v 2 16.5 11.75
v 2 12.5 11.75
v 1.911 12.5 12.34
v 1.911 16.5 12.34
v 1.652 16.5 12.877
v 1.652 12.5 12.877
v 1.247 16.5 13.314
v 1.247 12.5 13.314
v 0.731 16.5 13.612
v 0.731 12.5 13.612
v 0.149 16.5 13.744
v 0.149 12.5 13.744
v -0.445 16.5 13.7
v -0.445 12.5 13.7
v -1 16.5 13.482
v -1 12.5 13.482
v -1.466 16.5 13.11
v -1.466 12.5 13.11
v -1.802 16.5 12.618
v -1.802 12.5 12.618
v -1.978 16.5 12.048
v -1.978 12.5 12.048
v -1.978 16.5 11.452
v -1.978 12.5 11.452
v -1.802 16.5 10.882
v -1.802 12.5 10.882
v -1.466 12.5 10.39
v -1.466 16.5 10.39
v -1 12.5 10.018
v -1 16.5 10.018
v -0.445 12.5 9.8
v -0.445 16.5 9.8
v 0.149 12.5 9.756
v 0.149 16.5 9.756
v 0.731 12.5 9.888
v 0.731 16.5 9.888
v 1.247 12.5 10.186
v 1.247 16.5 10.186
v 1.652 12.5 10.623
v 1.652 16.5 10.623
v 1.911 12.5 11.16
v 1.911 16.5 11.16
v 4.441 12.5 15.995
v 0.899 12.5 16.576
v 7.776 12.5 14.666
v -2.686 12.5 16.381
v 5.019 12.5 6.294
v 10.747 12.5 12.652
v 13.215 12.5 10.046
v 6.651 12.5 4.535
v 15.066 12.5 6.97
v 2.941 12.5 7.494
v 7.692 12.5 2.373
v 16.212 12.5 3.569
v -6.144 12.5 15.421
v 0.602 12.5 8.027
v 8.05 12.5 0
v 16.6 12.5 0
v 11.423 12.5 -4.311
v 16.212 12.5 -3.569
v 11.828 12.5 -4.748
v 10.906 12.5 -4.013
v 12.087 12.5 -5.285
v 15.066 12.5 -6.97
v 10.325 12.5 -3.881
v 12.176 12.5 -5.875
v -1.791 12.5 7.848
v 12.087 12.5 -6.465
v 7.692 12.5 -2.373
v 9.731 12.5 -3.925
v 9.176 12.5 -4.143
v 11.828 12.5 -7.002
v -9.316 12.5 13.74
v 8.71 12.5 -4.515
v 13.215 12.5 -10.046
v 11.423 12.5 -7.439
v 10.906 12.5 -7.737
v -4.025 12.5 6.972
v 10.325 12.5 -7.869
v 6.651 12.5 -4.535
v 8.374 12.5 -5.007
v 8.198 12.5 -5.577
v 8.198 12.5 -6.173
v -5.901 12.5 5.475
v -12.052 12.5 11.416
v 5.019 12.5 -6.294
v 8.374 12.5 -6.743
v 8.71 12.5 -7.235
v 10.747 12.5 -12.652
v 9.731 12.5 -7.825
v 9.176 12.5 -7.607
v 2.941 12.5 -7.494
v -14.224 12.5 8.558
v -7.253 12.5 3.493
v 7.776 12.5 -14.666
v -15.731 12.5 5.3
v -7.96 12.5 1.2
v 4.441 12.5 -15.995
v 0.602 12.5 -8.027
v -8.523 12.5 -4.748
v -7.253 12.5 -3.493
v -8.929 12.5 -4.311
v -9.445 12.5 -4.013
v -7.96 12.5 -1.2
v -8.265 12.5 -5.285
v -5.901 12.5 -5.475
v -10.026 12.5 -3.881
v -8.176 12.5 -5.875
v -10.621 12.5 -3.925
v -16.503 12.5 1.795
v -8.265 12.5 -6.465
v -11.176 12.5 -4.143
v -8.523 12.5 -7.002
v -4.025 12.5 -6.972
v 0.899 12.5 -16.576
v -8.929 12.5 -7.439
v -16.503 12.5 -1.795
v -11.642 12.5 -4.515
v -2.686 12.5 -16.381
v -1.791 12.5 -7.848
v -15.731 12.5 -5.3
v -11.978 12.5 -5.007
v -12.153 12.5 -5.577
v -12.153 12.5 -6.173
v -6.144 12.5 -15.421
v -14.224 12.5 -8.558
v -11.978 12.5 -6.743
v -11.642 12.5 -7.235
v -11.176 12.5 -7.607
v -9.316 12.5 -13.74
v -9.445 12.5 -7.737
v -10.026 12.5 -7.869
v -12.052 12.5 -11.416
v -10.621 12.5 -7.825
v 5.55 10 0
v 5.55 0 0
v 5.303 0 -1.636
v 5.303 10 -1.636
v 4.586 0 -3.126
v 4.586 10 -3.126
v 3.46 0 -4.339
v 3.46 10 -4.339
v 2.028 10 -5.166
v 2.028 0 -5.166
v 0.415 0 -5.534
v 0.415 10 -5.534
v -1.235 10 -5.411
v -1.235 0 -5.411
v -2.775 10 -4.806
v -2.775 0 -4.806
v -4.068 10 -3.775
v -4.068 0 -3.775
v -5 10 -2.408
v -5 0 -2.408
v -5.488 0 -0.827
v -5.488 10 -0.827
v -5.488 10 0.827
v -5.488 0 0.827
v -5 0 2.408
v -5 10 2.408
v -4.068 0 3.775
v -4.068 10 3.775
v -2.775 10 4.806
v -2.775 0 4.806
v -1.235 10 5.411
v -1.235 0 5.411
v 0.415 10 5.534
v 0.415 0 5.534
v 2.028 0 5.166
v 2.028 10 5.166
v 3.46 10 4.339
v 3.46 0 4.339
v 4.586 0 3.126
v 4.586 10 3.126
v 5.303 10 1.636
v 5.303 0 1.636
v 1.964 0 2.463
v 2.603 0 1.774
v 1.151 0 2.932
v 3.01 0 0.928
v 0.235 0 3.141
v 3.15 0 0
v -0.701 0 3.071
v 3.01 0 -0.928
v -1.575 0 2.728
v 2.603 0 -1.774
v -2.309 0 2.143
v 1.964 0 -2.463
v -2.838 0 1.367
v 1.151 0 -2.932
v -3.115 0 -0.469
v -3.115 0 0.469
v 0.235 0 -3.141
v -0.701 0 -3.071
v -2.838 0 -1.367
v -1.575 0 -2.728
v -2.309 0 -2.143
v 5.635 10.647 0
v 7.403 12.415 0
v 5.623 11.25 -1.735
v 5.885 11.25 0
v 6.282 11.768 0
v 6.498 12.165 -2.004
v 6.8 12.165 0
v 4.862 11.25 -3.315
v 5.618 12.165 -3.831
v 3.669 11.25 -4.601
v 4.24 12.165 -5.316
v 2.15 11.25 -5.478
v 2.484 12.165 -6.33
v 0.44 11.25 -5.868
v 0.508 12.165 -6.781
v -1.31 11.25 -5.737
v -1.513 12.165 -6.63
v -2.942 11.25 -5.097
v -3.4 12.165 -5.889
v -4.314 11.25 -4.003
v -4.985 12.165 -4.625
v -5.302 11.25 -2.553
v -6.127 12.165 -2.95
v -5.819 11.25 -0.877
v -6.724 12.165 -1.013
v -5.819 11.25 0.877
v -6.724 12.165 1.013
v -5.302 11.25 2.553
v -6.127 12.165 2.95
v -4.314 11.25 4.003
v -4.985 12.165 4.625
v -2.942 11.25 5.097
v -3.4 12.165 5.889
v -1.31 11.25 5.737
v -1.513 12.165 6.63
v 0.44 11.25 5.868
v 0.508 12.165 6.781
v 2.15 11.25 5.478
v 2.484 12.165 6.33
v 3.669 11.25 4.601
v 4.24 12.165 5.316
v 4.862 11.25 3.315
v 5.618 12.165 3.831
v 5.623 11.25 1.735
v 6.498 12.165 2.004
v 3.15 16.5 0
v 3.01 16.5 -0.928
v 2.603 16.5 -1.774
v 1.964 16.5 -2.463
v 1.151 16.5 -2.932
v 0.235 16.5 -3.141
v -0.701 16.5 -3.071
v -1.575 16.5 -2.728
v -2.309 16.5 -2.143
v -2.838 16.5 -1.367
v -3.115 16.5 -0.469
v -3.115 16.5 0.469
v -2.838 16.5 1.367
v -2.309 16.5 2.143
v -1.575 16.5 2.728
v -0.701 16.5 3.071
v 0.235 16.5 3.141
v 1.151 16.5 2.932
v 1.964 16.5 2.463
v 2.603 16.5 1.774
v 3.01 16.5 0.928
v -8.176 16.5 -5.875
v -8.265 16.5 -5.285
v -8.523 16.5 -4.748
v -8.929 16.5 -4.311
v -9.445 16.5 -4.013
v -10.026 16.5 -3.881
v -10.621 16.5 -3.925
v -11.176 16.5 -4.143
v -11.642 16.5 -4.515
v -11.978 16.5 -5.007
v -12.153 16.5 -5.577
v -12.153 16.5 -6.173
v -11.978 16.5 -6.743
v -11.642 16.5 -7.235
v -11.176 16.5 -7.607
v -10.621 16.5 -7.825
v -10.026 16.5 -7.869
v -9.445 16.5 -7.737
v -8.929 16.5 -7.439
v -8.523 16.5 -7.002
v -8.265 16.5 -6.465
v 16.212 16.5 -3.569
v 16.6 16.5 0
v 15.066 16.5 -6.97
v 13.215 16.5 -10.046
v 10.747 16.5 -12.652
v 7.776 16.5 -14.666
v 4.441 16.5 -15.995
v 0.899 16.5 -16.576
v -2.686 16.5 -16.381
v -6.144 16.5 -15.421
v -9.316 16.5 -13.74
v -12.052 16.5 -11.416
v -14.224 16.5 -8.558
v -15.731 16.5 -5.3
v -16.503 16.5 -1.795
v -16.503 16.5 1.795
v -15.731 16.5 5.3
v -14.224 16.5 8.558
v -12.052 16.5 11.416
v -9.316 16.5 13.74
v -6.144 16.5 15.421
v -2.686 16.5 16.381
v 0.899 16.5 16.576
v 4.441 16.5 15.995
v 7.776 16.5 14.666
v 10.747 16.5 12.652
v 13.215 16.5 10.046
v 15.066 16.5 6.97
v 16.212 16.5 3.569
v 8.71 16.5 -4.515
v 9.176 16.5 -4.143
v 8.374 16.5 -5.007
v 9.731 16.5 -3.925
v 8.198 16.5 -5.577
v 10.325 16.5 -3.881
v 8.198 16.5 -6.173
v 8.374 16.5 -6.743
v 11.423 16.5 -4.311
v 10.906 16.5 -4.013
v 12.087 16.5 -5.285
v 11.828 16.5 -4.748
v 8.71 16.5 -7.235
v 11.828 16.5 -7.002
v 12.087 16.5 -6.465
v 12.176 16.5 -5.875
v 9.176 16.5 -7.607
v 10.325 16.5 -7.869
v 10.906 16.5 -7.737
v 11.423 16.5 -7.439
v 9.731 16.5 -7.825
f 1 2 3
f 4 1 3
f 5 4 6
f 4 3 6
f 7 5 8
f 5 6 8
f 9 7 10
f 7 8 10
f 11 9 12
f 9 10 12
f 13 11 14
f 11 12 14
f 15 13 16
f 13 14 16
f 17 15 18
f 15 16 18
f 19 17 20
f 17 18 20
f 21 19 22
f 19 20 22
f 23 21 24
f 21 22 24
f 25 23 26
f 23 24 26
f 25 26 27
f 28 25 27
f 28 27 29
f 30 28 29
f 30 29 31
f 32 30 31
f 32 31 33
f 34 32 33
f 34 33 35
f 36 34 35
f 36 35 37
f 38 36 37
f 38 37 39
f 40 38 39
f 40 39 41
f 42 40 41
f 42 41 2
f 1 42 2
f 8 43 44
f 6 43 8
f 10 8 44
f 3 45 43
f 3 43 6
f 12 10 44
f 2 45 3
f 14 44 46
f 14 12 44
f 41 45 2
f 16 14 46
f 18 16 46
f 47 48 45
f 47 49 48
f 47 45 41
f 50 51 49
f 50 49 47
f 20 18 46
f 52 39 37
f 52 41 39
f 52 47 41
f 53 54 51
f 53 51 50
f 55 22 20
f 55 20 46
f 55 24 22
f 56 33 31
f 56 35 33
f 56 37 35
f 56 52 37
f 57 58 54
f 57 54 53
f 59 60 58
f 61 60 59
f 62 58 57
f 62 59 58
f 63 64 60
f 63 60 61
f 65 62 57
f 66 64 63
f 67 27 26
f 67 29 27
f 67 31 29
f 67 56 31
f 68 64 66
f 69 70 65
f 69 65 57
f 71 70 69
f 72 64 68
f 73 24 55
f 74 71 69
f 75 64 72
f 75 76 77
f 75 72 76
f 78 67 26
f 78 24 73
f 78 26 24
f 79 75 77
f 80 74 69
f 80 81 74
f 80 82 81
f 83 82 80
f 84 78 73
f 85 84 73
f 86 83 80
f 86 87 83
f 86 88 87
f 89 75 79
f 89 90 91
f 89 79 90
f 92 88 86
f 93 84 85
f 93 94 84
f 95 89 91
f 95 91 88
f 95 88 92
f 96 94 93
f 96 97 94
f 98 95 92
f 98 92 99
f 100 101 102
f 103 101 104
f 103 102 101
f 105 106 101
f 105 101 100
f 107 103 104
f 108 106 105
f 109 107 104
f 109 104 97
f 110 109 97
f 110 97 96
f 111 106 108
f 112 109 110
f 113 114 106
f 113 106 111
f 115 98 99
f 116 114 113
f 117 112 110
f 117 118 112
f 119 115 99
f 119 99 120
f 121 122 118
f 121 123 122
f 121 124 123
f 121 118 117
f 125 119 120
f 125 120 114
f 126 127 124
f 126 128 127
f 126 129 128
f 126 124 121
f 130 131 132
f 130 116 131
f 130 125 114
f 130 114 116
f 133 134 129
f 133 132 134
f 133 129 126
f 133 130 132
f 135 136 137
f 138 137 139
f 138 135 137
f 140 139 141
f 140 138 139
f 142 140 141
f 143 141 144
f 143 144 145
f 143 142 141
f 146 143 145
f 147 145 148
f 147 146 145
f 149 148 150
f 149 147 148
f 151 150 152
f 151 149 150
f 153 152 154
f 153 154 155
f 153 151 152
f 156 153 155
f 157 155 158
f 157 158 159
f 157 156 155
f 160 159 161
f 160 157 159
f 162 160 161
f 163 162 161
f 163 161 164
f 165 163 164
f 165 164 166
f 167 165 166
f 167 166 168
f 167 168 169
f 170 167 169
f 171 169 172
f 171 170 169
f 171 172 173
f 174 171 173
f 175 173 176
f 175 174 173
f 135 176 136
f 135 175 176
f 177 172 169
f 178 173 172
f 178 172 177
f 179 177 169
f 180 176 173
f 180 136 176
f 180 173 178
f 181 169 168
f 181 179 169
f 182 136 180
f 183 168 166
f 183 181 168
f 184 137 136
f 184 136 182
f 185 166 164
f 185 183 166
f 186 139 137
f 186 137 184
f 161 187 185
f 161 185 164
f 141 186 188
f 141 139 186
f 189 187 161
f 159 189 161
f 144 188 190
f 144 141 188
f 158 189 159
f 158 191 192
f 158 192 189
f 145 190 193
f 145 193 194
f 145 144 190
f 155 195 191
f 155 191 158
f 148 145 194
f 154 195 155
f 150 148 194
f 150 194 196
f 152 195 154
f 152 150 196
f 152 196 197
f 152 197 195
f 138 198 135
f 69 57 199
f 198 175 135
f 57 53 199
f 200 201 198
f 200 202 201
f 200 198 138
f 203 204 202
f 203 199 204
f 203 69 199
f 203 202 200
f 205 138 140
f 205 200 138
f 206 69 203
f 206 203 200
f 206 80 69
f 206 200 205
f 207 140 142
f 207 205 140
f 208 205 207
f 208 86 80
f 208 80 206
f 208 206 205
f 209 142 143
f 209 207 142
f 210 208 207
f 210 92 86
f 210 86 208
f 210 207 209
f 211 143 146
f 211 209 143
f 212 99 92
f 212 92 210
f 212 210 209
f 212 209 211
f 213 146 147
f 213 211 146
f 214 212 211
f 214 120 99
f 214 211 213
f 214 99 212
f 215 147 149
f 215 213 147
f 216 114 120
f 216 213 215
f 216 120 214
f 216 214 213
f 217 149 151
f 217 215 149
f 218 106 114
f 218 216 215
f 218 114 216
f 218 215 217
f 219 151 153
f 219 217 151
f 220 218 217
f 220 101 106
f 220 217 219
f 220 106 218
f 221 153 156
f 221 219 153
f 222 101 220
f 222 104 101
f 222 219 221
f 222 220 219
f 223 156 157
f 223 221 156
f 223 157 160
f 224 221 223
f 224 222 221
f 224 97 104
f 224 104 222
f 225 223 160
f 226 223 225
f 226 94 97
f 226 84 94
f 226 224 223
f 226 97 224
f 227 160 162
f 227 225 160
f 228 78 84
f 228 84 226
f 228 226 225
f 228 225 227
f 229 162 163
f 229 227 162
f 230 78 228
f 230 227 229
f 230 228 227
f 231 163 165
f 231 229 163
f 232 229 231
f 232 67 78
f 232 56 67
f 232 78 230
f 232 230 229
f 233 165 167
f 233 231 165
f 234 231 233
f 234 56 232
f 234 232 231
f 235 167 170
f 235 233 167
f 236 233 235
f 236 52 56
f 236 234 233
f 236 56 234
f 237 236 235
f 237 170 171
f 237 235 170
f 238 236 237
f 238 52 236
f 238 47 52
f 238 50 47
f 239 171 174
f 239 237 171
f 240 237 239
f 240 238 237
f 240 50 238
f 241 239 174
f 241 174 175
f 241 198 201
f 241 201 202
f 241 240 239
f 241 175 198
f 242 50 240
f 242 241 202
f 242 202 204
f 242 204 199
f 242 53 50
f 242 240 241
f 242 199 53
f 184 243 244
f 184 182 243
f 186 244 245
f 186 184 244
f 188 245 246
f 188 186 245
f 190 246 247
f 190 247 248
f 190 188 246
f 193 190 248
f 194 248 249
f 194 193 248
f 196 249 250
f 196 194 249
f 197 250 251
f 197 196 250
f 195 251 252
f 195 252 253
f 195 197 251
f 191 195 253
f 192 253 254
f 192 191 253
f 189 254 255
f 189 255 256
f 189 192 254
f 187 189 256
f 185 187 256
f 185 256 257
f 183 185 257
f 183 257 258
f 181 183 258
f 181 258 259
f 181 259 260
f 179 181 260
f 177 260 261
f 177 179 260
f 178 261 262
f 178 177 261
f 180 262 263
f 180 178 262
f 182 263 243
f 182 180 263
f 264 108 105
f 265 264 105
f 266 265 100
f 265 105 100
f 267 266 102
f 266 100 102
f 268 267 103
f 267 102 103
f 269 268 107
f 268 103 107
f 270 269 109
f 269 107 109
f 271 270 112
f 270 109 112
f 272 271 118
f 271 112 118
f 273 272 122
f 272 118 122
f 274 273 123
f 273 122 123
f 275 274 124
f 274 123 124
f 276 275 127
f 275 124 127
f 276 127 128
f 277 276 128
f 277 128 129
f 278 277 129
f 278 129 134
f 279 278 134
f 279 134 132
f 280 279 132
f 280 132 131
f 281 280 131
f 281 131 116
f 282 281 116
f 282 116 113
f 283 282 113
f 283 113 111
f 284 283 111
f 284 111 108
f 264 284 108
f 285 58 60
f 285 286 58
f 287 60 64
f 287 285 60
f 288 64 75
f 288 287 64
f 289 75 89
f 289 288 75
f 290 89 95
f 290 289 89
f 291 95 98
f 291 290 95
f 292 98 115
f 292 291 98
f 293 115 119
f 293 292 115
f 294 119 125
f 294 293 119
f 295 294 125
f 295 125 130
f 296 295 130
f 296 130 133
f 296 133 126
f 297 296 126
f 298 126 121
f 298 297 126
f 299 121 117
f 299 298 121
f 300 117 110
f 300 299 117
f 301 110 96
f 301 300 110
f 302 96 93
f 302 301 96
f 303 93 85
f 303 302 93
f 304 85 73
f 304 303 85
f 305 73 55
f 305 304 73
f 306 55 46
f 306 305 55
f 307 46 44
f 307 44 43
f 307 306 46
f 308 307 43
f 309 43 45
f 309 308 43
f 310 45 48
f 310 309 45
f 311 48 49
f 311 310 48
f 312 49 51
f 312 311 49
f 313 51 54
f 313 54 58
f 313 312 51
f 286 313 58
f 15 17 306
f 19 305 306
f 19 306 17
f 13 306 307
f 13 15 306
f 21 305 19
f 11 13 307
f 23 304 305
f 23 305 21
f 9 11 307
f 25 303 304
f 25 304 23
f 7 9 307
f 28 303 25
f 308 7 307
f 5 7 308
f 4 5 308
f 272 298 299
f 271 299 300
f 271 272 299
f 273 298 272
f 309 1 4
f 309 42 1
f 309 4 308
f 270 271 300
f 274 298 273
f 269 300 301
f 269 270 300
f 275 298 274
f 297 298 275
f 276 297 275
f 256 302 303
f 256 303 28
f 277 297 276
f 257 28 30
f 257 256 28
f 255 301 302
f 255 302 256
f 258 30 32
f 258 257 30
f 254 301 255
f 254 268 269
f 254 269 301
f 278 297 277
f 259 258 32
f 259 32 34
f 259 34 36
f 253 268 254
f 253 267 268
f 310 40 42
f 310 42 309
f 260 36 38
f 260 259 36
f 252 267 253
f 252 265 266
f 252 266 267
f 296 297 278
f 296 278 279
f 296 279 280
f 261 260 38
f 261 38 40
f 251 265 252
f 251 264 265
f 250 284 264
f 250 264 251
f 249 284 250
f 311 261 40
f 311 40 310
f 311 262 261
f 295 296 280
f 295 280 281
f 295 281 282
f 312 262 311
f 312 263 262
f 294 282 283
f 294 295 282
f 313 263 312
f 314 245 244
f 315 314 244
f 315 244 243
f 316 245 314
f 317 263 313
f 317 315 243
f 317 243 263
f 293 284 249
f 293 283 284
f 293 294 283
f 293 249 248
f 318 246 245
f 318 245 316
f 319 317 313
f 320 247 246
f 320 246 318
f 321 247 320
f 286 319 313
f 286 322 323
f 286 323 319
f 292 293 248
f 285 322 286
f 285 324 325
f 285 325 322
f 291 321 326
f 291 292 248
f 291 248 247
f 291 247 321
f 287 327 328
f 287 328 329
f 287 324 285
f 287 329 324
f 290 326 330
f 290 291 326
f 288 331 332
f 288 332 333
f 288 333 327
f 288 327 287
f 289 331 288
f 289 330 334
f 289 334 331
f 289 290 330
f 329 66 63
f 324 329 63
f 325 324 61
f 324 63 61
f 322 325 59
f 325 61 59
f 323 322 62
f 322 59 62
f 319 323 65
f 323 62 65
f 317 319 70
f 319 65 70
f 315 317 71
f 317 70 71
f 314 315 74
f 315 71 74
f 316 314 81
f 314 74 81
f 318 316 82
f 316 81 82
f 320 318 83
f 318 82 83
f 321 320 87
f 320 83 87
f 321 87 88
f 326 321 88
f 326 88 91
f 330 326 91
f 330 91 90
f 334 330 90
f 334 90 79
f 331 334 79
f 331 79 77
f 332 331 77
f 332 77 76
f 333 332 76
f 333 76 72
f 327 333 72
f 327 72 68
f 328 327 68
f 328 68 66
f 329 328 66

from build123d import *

# Parameters (mm, degrees)
ESQUISSE2_R             = 2
ENL_V_MAT_EXTRU_1_DEPTH = 5


with BuildPart() as part:
    # Esquisse1 → Révolution1 (revolve)
    with BuildSketch(Plane.XY):
        with BuildLine():
            Line((16.6, 16.5), (3.15, 16.5))
            Line((3.15, 16.5), (3.15, 0))
            Line((3.15, 0), (5.55, 0))
            Line((5.55, 0), (5.55, 10))
            ThreePointArc((5.55, 10), (6.282233047, 11.767766953), (8.05, 12.5))
            Line((8.05, 12.5), (16.6, 12.5))
            Line((16.6, 12.5), (16.6, 16.5))
        make_face()
    revolve(axis=Axis((0, 0, 0), (0, 1, 0)))

    # Esquisse2 → Enlèv. mat.-Extru.1 (cut, through all)
    with BuildSketch(Plane.XZ.offset(-12.5)):
        with Locations((0, 11.75)):
            Circle(ESQUISSE2_R)
        with Locations((10.175798494, -5.875)):
            Circle(ESQUISSE2_R)
        with Locations((-10.175798494, -5.875)):
            Circle(ESQUISSE2_R)
    extrude(amount=-ENL_V_MAT_EXTRU_1_DEPTH, mode=Mode.SUBTRACT)


solid = part.part
